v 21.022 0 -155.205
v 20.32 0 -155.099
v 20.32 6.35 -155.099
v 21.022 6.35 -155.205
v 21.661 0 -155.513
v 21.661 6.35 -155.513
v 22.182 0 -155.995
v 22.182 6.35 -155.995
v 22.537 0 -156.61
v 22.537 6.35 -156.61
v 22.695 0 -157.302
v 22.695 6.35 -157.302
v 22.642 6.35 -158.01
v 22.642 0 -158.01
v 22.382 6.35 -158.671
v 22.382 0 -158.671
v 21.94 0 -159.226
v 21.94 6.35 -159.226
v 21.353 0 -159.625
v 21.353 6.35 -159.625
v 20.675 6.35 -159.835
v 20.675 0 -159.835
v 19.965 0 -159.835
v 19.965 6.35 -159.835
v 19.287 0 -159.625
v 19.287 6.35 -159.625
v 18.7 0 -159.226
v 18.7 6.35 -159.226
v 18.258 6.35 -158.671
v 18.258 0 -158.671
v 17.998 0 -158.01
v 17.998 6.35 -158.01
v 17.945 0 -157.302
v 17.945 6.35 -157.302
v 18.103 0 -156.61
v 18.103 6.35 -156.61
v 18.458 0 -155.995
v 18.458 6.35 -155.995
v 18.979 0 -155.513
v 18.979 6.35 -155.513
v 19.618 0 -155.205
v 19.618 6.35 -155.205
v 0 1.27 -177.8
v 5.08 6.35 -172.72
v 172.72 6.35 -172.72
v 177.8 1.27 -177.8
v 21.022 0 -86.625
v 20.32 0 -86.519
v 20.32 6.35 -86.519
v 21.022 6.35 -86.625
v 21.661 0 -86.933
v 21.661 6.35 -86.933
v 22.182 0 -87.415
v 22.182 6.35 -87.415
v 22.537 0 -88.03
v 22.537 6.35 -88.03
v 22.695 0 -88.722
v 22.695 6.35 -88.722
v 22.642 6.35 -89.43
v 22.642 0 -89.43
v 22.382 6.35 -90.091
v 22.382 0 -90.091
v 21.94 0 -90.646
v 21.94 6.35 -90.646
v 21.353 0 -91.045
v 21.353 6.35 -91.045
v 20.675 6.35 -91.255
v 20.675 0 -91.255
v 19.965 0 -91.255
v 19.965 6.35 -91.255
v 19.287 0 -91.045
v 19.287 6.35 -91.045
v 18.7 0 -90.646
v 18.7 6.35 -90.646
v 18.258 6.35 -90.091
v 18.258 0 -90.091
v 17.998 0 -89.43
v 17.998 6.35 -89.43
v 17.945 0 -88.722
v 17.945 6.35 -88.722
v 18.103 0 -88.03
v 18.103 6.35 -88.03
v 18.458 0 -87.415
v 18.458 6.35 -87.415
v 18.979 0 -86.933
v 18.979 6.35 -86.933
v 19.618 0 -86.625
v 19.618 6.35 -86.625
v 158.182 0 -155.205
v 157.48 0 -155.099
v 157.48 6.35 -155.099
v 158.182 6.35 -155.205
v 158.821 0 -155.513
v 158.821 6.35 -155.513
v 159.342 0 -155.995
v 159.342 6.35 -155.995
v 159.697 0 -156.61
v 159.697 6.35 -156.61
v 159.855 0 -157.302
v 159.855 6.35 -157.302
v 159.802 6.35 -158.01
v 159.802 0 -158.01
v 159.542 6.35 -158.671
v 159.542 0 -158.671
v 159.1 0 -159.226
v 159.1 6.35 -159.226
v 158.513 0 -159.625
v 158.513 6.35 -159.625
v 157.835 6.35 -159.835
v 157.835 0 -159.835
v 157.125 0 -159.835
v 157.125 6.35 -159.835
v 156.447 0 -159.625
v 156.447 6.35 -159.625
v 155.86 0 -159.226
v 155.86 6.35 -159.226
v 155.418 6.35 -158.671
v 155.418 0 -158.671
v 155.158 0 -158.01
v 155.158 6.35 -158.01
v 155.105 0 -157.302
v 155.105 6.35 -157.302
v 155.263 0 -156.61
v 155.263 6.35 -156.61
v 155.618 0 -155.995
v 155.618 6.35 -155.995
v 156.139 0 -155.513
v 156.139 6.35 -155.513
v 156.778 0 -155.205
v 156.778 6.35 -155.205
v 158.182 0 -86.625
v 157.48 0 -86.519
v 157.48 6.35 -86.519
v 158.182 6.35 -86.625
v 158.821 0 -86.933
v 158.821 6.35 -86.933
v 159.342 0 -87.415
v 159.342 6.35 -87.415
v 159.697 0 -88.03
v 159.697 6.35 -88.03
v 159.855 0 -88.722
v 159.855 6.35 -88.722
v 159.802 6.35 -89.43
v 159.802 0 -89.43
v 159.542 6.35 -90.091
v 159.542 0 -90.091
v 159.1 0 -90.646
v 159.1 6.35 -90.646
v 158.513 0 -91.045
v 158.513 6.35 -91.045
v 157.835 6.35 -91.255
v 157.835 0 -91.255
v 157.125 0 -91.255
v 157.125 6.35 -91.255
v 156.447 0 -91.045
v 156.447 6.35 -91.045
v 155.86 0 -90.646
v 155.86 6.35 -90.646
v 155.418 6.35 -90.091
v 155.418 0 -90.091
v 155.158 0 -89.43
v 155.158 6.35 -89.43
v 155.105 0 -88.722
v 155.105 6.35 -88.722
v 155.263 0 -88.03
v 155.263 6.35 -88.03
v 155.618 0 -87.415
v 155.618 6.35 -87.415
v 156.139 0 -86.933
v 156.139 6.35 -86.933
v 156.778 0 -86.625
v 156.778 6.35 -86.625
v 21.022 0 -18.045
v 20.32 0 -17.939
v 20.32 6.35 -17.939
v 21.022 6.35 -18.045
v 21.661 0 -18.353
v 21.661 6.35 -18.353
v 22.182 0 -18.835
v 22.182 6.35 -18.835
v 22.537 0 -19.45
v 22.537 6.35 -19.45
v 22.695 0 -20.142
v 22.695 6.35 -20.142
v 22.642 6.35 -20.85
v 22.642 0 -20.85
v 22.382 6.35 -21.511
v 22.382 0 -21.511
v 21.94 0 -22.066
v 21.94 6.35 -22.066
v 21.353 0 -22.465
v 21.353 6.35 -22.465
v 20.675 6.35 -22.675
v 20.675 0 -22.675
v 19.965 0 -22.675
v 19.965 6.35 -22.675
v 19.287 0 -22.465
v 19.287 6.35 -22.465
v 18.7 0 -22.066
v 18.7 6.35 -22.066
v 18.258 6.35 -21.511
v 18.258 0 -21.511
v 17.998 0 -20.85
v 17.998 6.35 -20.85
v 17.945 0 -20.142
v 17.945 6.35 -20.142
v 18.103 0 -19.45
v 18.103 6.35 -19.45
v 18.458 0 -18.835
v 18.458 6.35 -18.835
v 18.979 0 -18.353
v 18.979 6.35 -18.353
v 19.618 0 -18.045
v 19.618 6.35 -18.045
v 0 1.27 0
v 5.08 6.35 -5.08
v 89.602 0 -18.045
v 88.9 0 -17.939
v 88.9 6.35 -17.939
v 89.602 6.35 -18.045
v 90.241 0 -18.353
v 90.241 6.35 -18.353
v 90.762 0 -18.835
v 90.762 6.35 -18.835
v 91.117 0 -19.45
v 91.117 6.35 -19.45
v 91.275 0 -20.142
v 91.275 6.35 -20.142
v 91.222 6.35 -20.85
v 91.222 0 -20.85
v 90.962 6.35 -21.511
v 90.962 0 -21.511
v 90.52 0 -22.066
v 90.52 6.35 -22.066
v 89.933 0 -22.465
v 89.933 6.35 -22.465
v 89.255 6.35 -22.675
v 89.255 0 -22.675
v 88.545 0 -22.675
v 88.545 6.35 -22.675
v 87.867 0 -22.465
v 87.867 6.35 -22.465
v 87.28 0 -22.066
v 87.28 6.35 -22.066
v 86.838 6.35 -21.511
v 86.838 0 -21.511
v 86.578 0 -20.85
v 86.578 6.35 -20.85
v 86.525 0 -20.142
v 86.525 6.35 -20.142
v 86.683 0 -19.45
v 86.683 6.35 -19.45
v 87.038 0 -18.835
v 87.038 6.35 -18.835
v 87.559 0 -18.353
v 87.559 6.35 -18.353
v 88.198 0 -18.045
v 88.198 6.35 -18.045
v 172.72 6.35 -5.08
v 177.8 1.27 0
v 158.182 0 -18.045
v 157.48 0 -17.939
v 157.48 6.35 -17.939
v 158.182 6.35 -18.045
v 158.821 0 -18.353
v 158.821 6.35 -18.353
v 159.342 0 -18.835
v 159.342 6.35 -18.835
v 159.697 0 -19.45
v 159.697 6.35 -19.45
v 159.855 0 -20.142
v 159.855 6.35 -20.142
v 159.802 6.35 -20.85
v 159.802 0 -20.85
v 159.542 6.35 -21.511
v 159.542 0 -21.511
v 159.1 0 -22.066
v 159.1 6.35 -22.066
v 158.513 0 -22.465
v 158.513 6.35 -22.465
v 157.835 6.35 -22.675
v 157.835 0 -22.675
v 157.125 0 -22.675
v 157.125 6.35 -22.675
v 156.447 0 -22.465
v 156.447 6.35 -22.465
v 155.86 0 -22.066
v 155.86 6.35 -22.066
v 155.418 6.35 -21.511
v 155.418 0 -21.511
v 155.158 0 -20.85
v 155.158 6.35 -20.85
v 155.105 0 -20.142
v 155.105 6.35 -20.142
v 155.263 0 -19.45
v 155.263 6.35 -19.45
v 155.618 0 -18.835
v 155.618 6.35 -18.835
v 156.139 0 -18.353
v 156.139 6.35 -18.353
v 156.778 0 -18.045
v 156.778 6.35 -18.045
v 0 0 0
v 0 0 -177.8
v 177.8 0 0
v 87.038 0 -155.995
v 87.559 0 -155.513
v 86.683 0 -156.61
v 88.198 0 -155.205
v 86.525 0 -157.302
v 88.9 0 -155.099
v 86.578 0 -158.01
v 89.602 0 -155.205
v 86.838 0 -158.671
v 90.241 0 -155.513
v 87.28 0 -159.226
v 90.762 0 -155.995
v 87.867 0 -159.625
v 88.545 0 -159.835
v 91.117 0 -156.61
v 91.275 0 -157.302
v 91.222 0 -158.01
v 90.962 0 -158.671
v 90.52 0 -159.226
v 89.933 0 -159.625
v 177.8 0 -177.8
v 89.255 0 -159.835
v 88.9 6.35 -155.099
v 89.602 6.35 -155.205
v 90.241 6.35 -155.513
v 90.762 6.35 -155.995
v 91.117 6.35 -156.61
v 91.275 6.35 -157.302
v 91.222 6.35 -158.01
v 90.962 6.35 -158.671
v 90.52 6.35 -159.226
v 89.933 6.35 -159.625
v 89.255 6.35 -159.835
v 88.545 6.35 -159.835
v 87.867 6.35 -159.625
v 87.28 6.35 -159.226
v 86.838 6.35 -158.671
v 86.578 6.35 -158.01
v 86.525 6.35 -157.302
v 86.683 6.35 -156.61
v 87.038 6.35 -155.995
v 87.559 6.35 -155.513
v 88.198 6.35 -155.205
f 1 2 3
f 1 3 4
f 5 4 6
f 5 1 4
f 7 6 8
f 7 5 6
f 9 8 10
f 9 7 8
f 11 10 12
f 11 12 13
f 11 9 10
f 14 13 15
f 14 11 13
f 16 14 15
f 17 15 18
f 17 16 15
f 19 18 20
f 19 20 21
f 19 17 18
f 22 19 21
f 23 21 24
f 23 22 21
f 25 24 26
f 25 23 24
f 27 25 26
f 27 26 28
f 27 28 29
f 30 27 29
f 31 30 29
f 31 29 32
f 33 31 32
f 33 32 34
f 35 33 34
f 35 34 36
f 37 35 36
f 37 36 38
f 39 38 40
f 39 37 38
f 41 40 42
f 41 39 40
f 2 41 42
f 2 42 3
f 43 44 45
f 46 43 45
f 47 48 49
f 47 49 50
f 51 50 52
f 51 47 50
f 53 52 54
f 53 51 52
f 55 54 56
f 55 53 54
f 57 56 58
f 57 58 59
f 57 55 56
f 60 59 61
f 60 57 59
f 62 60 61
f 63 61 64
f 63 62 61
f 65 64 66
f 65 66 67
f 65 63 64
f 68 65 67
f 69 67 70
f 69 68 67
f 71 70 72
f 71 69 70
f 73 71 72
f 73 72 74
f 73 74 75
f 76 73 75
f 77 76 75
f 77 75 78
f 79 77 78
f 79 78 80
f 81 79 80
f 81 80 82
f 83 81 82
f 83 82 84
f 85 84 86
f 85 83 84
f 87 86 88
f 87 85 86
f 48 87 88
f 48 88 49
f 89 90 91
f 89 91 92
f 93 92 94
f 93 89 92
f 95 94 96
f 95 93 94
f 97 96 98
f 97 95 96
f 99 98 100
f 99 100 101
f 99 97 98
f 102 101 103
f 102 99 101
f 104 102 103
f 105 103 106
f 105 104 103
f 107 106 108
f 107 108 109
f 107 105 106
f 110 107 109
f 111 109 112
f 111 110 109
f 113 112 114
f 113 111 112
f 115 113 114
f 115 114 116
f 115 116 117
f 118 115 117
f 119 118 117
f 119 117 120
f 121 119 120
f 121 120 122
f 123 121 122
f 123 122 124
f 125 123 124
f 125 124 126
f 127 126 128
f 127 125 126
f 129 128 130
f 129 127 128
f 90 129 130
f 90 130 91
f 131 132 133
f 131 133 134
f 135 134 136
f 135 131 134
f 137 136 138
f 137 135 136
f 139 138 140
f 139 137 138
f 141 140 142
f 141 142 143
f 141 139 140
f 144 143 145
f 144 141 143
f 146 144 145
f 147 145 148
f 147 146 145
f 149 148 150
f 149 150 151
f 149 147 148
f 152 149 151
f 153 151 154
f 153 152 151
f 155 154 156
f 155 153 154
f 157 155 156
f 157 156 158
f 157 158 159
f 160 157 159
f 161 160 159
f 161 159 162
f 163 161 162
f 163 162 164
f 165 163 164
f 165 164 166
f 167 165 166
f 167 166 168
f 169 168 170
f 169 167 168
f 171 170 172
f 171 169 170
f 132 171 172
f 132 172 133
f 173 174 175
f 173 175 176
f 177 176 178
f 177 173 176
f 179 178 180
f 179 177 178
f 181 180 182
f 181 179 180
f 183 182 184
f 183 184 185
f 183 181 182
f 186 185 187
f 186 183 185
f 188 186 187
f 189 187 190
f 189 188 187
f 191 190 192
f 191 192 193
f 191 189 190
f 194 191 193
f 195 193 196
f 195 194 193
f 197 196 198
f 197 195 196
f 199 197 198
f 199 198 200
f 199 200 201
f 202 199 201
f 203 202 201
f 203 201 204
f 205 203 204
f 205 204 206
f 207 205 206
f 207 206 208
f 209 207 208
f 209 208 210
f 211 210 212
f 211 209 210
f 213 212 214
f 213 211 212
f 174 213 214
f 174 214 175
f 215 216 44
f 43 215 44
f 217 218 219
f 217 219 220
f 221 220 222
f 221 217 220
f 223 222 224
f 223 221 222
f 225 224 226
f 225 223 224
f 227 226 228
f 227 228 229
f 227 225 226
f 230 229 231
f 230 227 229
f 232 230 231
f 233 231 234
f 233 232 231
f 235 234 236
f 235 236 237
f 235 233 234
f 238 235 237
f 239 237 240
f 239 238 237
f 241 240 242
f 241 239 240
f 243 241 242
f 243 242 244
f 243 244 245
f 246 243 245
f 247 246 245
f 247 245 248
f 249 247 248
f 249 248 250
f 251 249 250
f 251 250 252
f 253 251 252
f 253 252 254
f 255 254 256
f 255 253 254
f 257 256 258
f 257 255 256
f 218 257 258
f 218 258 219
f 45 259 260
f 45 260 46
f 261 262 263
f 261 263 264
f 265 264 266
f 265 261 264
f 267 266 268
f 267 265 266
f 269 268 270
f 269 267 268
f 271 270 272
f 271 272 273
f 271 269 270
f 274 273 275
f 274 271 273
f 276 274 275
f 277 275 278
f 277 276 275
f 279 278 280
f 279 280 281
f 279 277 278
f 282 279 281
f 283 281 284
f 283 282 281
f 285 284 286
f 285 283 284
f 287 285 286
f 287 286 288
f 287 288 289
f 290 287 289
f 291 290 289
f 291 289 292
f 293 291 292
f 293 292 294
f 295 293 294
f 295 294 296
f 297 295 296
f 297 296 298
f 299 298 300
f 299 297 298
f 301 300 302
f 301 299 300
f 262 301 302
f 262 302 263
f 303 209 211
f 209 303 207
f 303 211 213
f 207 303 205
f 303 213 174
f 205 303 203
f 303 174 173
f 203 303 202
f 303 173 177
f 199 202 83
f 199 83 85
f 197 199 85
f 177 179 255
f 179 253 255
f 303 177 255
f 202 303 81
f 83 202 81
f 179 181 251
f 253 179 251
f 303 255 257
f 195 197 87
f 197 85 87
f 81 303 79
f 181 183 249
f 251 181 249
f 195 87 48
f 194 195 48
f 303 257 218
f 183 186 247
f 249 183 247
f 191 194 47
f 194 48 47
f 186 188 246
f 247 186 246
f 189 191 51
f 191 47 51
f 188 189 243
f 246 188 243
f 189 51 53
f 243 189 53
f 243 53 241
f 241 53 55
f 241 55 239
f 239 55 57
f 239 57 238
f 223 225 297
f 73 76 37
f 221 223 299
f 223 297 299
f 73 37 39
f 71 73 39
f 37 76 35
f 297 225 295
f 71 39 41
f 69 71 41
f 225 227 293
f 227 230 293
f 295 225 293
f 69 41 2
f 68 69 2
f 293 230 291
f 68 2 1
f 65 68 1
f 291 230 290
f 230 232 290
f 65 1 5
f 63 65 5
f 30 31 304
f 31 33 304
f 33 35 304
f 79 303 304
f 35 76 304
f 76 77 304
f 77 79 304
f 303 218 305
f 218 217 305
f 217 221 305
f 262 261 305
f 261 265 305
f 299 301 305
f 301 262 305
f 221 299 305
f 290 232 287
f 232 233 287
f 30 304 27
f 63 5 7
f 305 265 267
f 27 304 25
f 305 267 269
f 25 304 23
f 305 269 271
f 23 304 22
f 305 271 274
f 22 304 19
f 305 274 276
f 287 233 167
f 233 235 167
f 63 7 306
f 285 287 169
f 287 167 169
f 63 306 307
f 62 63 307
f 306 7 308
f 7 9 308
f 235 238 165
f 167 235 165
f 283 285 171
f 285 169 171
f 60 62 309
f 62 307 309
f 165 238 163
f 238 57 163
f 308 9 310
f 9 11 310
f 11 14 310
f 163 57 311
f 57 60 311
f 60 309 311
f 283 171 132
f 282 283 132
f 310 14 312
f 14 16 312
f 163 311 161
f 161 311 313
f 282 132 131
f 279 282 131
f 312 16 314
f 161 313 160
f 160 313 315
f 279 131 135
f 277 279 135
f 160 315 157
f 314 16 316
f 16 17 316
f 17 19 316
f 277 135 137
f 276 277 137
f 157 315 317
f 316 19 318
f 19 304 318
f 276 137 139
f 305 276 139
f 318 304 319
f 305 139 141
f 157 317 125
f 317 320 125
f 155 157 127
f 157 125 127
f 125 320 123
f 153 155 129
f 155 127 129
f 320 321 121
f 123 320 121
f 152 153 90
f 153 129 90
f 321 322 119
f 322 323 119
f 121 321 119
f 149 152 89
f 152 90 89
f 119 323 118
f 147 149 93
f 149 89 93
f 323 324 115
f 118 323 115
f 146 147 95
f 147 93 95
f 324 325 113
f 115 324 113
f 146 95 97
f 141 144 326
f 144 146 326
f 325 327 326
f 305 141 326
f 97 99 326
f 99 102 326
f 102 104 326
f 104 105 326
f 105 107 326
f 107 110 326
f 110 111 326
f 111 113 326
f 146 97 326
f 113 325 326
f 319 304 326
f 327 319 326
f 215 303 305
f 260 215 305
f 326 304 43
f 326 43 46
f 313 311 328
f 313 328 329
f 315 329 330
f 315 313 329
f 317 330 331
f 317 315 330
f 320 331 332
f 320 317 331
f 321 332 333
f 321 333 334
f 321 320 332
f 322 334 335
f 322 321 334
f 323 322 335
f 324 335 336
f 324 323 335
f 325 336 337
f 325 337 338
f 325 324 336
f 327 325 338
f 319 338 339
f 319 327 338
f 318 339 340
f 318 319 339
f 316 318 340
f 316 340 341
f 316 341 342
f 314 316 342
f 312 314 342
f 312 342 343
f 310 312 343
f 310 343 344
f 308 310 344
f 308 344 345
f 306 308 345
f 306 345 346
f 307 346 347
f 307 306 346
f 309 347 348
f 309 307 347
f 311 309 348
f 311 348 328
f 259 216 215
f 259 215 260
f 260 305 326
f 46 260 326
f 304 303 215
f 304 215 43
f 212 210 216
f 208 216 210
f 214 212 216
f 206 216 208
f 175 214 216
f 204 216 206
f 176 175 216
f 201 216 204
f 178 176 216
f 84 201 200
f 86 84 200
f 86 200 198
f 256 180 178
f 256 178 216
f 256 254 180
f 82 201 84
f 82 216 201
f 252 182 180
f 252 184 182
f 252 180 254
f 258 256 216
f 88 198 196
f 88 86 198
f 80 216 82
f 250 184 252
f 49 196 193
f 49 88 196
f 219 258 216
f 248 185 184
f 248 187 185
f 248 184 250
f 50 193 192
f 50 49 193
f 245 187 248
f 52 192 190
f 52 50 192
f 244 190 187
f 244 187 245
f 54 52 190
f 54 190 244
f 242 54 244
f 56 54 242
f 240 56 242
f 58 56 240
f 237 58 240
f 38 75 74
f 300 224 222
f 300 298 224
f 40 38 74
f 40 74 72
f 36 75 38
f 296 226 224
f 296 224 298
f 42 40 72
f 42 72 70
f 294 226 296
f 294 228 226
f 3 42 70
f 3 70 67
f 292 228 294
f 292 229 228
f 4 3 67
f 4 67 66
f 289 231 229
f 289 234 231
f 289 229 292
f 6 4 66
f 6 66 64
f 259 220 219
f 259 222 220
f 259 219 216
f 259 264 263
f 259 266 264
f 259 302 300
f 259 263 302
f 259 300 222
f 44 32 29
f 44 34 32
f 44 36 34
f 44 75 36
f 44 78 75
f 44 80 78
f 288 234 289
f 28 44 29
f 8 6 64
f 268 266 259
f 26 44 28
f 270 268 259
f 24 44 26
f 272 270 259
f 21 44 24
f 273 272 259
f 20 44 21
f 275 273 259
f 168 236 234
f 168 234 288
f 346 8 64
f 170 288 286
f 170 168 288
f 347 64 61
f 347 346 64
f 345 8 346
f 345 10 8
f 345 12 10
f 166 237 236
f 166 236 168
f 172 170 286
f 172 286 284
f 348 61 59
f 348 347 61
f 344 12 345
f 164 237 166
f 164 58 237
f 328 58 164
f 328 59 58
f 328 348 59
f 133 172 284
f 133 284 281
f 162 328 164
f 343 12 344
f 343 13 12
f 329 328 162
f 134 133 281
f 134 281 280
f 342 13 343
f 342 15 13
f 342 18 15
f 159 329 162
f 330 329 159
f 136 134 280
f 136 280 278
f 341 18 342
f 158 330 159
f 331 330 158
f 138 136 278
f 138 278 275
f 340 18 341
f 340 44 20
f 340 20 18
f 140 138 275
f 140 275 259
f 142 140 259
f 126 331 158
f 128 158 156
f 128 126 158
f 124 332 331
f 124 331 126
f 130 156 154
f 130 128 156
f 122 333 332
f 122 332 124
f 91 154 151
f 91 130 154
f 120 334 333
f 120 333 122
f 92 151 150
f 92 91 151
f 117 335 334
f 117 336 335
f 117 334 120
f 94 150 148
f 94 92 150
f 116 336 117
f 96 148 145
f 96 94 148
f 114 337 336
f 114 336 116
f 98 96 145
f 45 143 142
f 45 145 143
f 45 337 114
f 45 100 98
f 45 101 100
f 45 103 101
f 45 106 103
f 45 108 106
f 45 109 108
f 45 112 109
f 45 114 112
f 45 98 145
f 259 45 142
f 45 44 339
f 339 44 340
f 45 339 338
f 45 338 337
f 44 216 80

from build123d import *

# Parameters (mm, degrees)
SKETCH1_W           = 177.8
SKETCH1_H           = 177.8
SKETCH1_R           = 2.38125
BOSS_EXTRUDE1_DEPTH = 6.35
CHAMFER1_SIZE       = 5.08


with BuildPart() as part:
    # Sketch1 → Boss-Extrude1 (new body)
    with BuildSketch(Plane(origin=(0, 0, 0), x_dir=(1, 0, 0), z_dir=(0, 1, 0))):
        with Locations((88.9, 88.9)):
            Rectangle(SKETCH1_W, SKETCH1_H)
        with Locations(Location((20.32, 157.48, 0), (0, 0, 270))):
            Circle(SKETCH1_R, mode=Mode.SUBTRACT)
        with Locations(Location((88.9, 157.48, 0), (0, 0, 270))):
            Circle(SKETCH1_R, mode=Mode.SUBTRACT)
        with Locations(Location((157.48, 157.48, 0), (0, 0, 270))):
            Circle(SKETCH1_R, mode=Mode.SUBTRACT)
        with Locations(Location((20.32, 88.9, 0), (0, 0, 270))):
            Circle(SKETCH1_R, mode=Mode.SUBTRACT)
        with Locations(Location((20.32, 20.32, 0), (0, 0, 270))):
            Circle(SKETCH1_R, mode=Mode.SUBTRACT)
        with Locations(Location((88.9, 20.32, 0), (0, 0, 270))):
            Circle(SKETCH1_R, mode=Mode.SUBTRACT)
        with Locations(Location((157.48, 88.9, 0), (0, 0, 270))):
            Circle(SKETCH1_R, mode=Mode.SUBTRACT)
        with Locations(Location((157.48, 20.32, 0), (0, 0, 270))):
            Circle(SKETCH1_R, mode=Mode.SUBTRACT)
    extrude(amount=BOSS_EXTRUDE1_DEPTH)

    # Chamfer1
    chamfer1_edges = [part.edges().sort_by_distance(p)[0] for p in [
        (177.8, 6.35, -88.9),
        (88.9, 6.35, -177.8),
        (0, 6.35, -88.9),
        (88.9, 6.35, 0),
    ]]
    chamfer(chamfer1_edges, length=CHAMFER1_SIZE)


solid = part.part
